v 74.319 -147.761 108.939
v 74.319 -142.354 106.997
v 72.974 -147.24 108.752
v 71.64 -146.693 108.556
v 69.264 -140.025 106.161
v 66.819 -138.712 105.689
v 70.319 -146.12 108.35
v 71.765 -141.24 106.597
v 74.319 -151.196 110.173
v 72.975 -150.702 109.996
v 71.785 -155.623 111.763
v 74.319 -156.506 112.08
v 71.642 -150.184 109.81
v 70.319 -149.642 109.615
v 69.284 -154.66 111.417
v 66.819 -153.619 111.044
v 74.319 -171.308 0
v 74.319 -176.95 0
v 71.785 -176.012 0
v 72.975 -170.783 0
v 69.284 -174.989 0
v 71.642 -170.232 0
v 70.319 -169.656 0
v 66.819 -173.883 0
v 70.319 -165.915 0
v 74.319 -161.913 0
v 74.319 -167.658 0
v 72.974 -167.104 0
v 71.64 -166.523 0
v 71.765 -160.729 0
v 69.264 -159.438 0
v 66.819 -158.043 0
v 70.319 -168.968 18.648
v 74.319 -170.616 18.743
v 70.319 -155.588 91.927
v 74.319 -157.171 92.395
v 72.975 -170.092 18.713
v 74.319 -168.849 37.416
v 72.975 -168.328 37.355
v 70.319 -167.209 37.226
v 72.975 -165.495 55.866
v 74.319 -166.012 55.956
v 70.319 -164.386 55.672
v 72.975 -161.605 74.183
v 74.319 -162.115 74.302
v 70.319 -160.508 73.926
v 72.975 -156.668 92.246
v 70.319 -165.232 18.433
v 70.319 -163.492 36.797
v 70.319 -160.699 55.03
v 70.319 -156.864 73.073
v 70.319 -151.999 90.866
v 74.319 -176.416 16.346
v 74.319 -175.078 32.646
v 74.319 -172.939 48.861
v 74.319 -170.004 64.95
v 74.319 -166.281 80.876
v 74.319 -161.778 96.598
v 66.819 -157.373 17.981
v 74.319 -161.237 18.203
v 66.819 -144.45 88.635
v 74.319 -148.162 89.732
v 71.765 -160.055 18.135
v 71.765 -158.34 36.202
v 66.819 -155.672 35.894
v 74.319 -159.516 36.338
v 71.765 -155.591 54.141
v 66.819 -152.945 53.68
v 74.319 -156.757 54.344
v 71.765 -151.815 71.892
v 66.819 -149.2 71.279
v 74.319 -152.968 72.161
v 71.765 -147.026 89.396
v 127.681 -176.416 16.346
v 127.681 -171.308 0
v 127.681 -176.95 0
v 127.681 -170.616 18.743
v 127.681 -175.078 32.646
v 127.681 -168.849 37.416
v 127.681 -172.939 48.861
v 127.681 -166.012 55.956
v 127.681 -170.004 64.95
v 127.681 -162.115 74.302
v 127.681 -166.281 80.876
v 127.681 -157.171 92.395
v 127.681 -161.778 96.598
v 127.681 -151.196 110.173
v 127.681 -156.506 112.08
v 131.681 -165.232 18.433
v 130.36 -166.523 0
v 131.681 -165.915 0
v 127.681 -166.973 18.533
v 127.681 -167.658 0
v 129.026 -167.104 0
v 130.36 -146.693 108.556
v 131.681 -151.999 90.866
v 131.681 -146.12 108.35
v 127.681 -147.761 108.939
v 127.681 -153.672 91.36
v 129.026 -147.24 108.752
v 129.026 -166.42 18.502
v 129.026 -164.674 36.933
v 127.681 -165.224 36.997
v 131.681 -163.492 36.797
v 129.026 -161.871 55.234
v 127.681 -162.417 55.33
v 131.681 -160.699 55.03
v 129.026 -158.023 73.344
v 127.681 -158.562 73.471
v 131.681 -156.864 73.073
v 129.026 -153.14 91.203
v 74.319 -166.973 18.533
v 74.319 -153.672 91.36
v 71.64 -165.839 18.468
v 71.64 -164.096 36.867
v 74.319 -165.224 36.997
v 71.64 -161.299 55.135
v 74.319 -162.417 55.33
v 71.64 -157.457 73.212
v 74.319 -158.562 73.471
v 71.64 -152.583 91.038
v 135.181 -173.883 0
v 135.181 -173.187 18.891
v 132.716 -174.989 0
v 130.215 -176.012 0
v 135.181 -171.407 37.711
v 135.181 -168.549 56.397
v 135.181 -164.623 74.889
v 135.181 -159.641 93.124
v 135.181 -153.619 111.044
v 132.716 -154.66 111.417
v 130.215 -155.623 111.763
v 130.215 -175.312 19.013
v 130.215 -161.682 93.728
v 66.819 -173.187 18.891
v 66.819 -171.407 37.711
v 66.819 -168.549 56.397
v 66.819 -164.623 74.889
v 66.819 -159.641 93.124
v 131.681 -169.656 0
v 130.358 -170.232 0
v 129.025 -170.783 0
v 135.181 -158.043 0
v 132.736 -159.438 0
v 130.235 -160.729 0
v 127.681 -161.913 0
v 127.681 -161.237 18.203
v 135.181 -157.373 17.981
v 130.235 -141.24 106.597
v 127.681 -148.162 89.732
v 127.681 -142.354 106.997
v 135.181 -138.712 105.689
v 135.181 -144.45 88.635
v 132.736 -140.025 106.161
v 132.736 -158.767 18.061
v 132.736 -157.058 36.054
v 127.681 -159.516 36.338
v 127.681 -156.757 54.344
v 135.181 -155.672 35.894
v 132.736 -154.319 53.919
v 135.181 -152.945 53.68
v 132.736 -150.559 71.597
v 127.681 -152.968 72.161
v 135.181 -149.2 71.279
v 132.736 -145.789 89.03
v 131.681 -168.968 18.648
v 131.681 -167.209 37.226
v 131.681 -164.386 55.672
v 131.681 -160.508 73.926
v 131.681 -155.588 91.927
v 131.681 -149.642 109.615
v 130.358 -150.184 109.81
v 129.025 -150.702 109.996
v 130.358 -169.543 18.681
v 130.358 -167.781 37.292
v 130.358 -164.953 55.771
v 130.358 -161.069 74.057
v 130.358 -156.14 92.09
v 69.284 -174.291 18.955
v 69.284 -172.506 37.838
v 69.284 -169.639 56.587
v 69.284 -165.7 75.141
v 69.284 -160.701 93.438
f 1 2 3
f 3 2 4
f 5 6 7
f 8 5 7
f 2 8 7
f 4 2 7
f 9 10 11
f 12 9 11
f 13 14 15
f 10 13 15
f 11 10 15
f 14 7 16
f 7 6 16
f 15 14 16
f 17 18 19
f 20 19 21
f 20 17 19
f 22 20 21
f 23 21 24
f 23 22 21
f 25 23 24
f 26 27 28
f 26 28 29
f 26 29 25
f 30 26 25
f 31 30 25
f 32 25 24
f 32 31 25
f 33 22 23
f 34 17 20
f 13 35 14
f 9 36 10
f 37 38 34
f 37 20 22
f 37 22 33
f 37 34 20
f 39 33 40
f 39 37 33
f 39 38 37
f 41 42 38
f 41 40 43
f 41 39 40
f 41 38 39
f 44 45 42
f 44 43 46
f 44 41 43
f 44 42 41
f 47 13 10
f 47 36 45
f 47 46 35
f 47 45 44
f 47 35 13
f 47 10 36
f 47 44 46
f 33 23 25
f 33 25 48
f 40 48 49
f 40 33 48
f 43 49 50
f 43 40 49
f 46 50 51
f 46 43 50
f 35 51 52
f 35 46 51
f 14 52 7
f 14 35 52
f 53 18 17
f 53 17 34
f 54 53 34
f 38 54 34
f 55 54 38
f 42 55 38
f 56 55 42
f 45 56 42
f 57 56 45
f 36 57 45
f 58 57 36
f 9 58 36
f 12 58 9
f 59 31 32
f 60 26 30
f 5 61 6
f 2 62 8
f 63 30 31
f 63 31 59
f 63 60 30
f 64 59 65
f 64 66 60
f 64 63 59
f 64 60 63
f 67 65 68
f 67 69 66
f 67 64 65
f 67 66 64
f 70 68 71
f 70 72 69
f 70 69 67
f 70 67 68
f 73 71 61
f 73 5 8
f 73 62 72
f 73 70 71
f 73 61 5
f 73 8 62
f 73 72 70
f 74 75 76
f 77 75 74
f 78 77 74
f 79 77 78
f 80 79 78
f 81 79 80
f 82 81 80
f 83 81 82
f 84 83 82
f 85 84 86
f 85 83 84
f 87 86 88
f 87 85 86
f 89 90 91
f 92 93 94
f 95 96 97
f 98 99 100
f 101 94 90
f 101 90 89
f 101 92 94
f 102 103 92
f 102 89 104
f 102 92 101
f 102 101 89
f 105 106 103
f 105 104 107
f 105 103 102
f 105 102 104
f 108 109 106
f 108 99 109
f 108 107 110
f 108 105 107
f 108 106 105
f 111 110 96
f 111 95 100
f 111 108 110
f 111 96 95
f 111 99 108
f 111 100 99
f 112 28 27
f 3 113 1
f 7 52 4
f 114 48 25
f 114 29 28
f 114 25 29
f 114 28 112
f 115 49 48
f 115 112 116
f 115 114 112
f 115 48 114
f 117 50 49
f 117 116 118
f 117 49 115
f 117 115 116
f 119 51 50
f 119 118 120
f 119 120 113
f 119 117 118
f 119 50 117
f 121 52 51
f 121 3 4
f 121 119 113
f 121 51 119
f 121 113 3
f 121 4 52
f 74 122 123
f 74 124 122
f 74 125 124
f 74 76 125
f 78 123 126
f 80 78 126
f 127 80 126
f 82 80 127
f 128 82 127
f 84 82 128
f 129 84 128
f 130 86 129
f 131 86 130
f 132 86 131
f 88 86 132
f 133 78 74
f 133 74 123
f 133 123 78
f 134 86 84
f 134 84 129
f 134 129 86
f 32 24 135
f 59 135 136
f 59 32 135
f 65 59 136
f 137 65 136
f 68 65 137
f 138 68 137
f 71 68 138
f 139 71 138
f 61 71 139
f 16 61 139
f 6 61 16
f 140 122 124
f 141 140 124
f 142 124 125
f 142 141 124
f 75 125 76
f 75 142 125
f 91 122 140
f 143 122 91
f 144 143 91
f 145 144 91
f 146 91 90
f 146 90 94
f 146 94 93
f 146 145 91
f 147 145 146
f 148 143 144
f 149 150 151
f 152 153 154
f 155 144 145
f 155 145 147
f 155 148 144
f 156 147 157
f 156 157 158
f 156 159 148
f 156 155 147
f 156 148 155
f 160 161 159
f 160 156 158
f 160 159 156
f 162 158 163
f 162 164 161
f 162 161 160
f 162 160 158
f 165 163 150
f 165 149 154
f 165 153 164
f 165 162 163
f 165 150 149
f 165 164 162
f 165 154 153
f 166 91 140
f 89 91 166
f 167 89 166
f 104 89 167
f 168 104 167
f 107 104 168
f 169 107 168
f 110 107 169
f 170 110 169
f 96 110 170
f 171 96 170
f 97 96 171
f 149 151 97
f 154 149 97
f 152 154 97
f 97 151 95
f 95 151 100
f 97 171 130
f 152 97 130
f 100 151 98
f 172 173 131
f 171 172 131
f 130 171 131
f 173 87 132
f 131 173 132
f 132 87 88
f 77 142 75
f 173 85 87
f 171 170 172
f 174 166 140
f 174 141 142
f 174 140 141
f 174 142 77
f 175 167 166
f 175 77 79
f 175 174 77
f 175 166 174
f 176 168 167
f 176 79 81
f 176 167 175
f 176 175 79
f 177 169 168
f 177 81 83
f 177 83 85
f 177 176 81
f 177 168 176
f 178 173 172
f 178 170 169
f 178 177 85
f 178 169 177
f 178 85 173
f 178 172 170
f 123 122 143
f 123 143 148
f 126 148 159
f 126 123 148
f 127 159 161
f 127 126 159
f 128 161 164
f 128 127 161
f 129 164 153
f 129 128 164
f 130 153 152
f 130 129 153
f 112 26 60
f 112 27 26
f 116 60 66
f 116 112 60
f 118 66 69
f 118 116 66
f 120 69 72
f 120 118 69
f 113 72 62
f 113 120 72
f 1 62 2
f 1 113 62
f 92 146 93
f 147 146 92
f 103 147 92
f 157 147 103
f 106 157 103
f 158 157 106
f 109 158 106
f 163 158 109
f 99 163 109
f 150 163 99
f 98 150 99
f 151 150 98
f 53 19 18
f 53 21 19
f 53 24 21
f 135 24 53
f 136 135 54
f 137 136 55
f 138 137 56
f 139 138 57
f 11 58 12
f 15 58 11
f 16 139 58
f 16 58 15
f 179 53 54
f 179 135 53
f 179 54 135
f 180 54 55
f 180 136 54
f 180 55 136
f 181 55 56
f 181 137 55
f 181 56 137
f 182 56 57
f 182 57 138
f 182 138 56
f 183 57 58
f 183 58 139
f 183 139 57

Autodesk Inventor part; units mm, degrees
ref_plane "XZ Plane" through (0, 0, 0) normal (0, 1, 0) x (-1, 0, 0)
sketch "Эскиз1" plane through (0, 0, 0) normal (0, 0, 1) x (1, 0, 0)
  arc A0 (74.5189, -162) -> (127.4811, -162) centre (101, -101) ccw
  arc A1 (48.4714, -162) -> (153.5286, -162) centre (101, -101) ccw
  line L0 (-97.5257, 0) -> (307.6841, 0) projected
  line L1 (-39.6386, -162) -> (244.9538, -162)
  line L2 (101, -167.5) -> (101, -181.5)
  arc A2 (142.003, -162) -> (59.997, -162) centre (101, -101) ccw
  circle A3 centre (101, -101) radius 72
  circle A4 centre (101, -101) radius 75
  line L3 (170.7391, -120.21) -> (170.39, -120.21)
  line L4 (170.39, -120.21) -> (173.4981, -120.21)
  line L5 (31.61, -120.21) -> (28.5019, -120.21)
  line L6 (74.5189, -162) -> (74.5189, -177.0197)
  line L7 (127.4811, -162) -> (127.4811, -177.0197)
  line L8 (70.5189, -166.2296) -> (70.5189, -169.5266)
  line L9 (131.4811, -166.2296) -> (131.4811, -169.5266)
  point P0 (0, 0)
  point P1 (167.5699, -124.21)
  point P2 (163.3181, -124.21)
  point P3 (38.6819, -124.21)
  point P4 (34.4301, -124.21)
  point P5 (101, -174.5)
  point P6 (57.3652, -162)
  point P7 (144.6348, -162)
  point P8 (62.7508, -162)
  point P9 (170.7391, -120.21)
  point P10 (74.5189, -167.9533)
  point P11 (74.5189, -171.1694)
  point P12 (127.4811, -171.1694)
  point P13 (127.4811, -167.9533)
  dimension "d0" = 133
  dimension "d1" = 161
  dimension "d3" = -101
  dimension "d4" = 61
  dimension "d30" = 1.5
  dimension "d31" = 1.5
  dimension "d33" = 73.5
  dimension "d34" = 4
ref_plane "РабПлоскость1" through (0, 0, 60) normal (0, 0, 1) x (1, 0, 0)
sketch "Эскиз2" plane through (0, 0, 60) normal (0, 0, 1) x (1, 0, 0)
  circle A0 centre (101, -101) radius 70.5
  line L0 (-96.1046, 0) -> (307.4472, 0) projected
  arc A1 (34.4301, -164.21) -> (167.5699, -164.21) centre (101, -141) ccw
  arc A2 (38.6819, -164.21) -> (163.3181, -164.21) centre (101, -141) ccw
  line L1 (-38.4543, -164.21) -> (249.797, -164.21)
  point P0 (0, 0)
  dimension "d9" = 141
  dimension "d10" = 141
  dimension "d11" = 133
  dimension "d12" = 23.21
sketch "Эскиз3" plane through (0, 0, 0) normal (1, 0, 0) x (0, 1, 0)
  arc A0 (-211.5, 60) -> (-171.5, 0) centre (-52.4181, 122.7213) ccw
  point P0 (0, 0)
  point P1 (-164.21, 60)
  point P2 (-162, 0)
  dimension "d13" = 171
sketch "Эскиз4" plane through (0, 0, 0) normal (1, 0, 0) x (0, 1, 0)
  line L0 (0, -518.9739) -> (0, 512.8159) projected
  arc A0 (-151.3766, 110.2381) -> (-171.5, 0) centre (155.0612, -2.6563) ccw
  arc A1 (-171.3994, 5.874) -> (-171.5, 0) centre (0, 0) ccw
  point P0 (-131.3766, -110.2381)
  dimension "d25" = 326.572
sweep "Сдвиг2" add profiles "Эскиз1" path "Эскиз4" path curves A0 contours A0 L2 A3 L6 | A0 L7 A3 L2 | L6 A4 L8 A3 | A3 L2 A4 L6 | A3 L7 A4 L2 | A3 L9 A4 L7 | A4 L2 A1 L6 | A4 L7 A1 L2
ref_plane "РабПлоскость2" through (101, 0, 0) normal (1, 0, 0) x (0, 1, 0)
sketch "Эскиз5" plane through (101, 0, 0) normal (1, 0, 0) x (0, 1, 0)
  line L0 (-177.0197, 0) -> (-177.0197, 0) projected
  line L1 (-156.5714, 112.104) -> (-156.5714, 112.104) projected
  line L2 (-177.0197, 0) -> (-177.0197, 0) projected
  line L3 (-156.5714, 112.104) -> (-156.5714, 112.104) projected
  arc A0 (-162, 0) -> (-142.4359, 107.0266) centre (155.0612, -2.6563) ccw projected
  line L4 (-162, 0) -> (-181.5, 0) projected
  circle A1 centre (155.0612, -2.6563) radius 336.5717
  arc A2 (-156.5714, 112.104) -> (-177.0197, 0) centre (155.0612, -2.6563) ccw projected
  arc A3 (-156.5714, 112.104) -> (-177.0197, 0) centre (155.0612, -2.6563) ccw projected
  arc A4 (-156.5714, 112.104) -> (-177.0197, 0) centre (155.0612, -2.6563) ccw projected
  arc A5 (-156.5714, 112.104) -> (-177.0197, 0) centre (155.0612, -2.6563) ccw projected
  point P0 (0, 0)
  point P1 (-162, 0)
  point P2 (-142.4359, 107.0266)
  point P3 (-162, 0)
  point P4 (-142.4359, 107.0266)
  dimension "d28" = 673.1434
sketch "Эскиз7" plane through (101, -101, 0) normal (0, 0, -1) x (-1, 0, 0)
  arc A0 (26.4811, -66.9533) -> (30.4811, -65.2296) centre (0, 0) ccw projected
  line L0 (26.4811, -61) -> (26.4811, -66.9533) projected
  arc A1 (-26.4811, -61) -> (26.4811, -61) centre (0, 0) ccw projected
  line L1 (-26.4811, -66.9533) -> (-26.4811, -61) projected
  arc A2 (-30.4811, -65.2296) -> (-26.4811, -66.9533) centre (0, 0) ccw projected
  line L2 (-30.4811, -68.5266) -> (-30.4811, -65.2296) projected
  arc A3 (-30.4811, -68.5266) -> (-26.4811, -70.1694) centre (0, 0) ccw projected
  line L3 (-26.4811, -76.0197) -> (-26.4811, -70.1694) projected
  arc A4 (-26.4811, -76.0197) -> (26.4811, -76.0197) centre (0, 0) ccw projected
  line L4 (26.4811, -70.1694) -> (26.4811, -76.0197) projected
  arc A5 (26.4811, -70.1694) -> (30.4811, -68.5266) centre (0, 0) ccw projected
  line L5 (30.4811, -65.2296) -> (30.4811, -68.5266) projected
  line L6 (-26.6811, -66.6585) -> (-26.6811, -60.6944)
  arc A6 (-26.6811, -60.6944) -> (26.6811, -60.6944) centre (0, 0) ccw
  line L7 (26.6811, -60.6944) -> (26.6811, -66.6585)
  arc A7 (26.6811, -66.6585) -> (30.6811, -64.9146) centre (0, 0) ccw
  line L8 (30.6811, -64.9146) -> (30.6811, -68.6565)
  arc A8 (26.6811, -70.3076) -> (30.6811, -68.6565) centre (0, 0) ccw
  line L9 (26.6811, -70.3076) -> (26.6811, -76.1617)
  arc A9 (-26.6811, -76.1617) -> (26.6811, -76.1617) centre (0, 0) ccw
  line L10 (-26.6811, -76.1617) -> (-26.6811, -70.3076)
  arc A10 (-30.6811, -68.6565) -> (-26.6811, -70.3076) centre (0, 0) ccw
  line L11 (-30.6811, -68.6565) -> (-30.6811, -64.9146)
  arc A11 (-30.6811, -64.9146) -> (-26.6811, -66.6585) centre (0, 0) ccw
  circle A12 centre (0, 0) radius 66.5
  line L12 (-34.1811, -57.043) -> (-34.1811, -72.8828)
  line L13 (-26.4811, -66.9533) -> (-26.4811, -61) projected
  circle A13 centre (0, 0) radius 80.5
  line L14 (34.1811, -57.043) -> (34.1811, -72.8828)
  point P0 (101, 101)
  point P1 (26.6811, -75.9498)
  point P2 (34.1811, -72.8828)
  point P3 (34.1811, -57.043)
  point P4 (26.6811, -60.9128)
  point P5 (-26.6811, -60.9128)
  point P6 (-26.6811, -75.9498)
  dimension "d35" = 0.2
  dimension "d36" = 3.5
sketch3d "3D эскиз1"
  arc A0 (127.4811, -177.0197, 0) -> (127.4811, -156.5714, 112.104) centre (127.4811, 155.0612, -2.6563) ccw
sweep "Сдвиг3" add profiles "Эскиз7" path "3D эскиз1" contours A12 L14 A13 L9 A8 L8 A7 L7 | L6 A11 L11 A10 L10 A13 L12 A12
sketch "Эскиз8" plane through (101, -101, 0) normal (0, 0, -1) x (-1, 0, 0)
  arc A0 (26.4811, -66.9533) -> (30.4811, -65.2296) centre (0, 0) ccw projected
  line L0 (26.4811, -61) -> (26.4811, -66.9533) projected
  arc A1 (-26.4811, -61) -> (26.4811, -61) centre (0, 0) ccw projected
  line L1 (-26.4811, -66.9533) -> (-26.4811, -61) projected
  arc A2 (-30.4811, -65.2296) -> (-26.4811, -66.9533) centre (0, 0) ccw projected
  line L2 (-30.4811, -68.5266) -> (-30.4811, -65.2296) projected
  arc A3 (-30.4811, -68.5266) -> (-26.4811, -70.1694) centre (0, 0) ccw projected
  line L3 (-26.4811, -76.0197) -> (-26.4811, -70.1694) projected
  arc A4 (-26.4811, -76.0197) -> (26.4811, -76.0197) centre (0, 0) ccw projected
  line L4 (26.4811, -70.1694) -> (26.4811, -76.0197) projected
  arc A5 (26.4811, -70.1694) -> (30.4811, -68.5266) centre (0, 0) ccw projected
  line L5 (30.4811, -65.2296) -> (30.4811, -68.5266) projected
  point P0 (101, 101)
sketch3d "3D эскиз2"
  arc A0 (135.1811, -173.8828, 0) -> (135.1811, -153.6191, 111.0436) centre (135.1811, 155.0612, -2.6563) ccw
sweep "Сдвиг4" cut profiles "Эскиз8" path "3D эскиз2"
properties part number "крепл направления"
